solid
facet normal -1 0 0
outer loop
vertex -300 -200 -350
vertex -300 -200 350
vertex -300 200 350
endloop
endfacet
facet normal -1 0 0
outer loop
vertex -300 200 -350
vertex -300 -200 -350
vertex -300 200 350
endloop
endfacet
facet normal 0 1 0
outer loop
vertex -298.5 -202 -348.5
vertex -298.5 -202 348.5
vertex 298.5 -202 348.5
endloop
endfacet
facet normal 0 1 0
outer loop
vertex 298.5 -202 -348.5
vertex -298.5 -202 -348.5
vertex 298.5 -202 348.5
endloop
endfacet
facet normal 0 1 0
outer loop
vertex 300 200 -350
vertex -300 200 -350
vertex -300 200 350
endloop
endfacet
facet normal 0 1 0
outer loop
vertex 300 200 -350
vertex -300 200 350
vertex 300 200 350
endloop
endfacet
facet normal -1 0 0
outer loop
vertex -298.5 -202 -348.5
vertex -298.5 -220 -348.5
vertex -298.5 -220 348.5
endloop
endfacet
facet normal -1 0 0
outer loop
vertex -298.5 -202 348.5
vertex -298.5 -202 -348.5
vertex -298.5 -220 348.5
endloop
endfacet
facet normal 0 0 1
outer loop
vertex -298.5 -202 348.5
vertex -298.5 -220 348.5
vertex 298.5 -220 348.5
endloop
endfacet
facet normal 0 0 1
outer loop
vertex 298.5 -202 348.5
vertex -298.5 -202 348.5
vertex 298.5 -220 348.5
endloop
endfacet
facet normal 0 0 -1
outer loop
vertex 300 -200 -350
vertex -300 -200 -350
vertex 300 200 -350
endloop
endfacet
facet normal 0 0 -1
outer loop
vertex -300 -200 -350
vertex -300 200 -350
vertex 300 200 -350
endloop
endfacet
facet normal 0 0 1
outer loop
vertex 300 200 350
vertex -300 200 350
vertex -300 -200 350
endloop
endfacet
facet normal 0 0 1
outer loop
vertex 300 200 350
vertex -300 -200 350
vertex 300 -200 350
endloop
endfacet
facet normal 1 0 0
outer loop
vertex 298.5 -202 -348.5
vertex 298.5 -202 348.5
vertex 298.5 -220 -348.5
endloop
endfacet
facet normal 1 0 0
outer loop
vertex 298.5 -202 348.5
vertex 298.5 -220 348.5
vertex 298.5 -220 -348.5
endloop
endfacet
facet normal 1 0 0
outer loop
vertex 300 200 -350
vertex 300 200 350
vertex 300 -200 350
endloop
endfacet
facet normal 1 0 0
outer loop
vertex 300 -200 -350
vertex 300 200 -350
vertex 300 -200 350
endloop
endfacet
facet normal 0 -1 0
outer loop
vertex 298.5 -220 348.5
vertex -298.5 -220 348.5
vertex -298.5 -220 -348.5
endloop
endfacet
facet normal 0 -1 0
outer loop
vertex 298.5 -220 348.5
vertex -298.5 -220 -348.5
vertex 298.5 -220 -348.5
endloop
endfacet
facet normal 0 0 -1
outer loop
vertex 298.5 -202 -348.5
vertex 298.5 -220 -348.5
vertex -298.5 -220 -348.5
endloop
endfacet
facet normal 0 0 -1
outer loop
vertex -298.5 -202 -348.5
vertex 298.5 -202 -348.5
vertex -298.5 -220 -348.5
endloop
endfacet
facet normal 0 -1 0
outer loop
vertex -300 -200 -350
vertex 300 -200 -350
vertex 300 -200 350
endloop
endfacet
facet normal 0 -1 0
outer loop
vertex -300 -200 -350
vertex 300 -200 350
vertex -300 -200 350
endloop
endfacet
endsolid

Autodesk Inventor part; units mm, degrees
ref_plane "YZ Plane" through (0, 0, 0) normal (1, 0, 0) x (0, 1, 0)
ref_plane "XZ Plane" through (0, 0, 0) normal (0, 1, 0) x (-1, 0, 0)
ref_plane "XY Plane" through (0, 0, 0) normal (0, 0, 1) x (1, 0, 0)
sketch "Sketch1" plane through (0, 0, 0) normal (0, 0, 1) x (1, 0, 0)
  line L0 (-300, 200) -> (300, 200)
  line L1 (300, 200) -> (300, -200)
  line L2 (300, -200) -> (-300, -200)
  line L3 (-300, -200) -> (-300, 200)
  line L4 (-300, 200) -> (300, -200) construction
  line L5 (300, 200) -> (-300, -200) construction
  point P0 (0, 0)
  dimension "Width" = 600
  dimension "Depth" = 400
extrude "Extrusion1" add sketch "Sketch1" along normal mid plane 700
sketch "Sketch2" plane through (-300, -200, 350) normal (0, -1, 0) x (1, 0, 0)
  line L0 (600, 0) -> (600, -700) projected
  line L1 (0, 0) -> (600, 0) projected
  line L2 (0, 0) -> (0, -700) projected
  line L3 (600, -700) -> (0, -700) projected
  point P0 (300, -350)
extrude "Extrusion2" add sketch "Sketch2" against normal blind 18 separate body
sketch "Sketch4" plane through (-300, -200, 350) normal (0, -1, 0) x (1, 0, 0)
  line L0 (600, -700) -> (600, 0) construction
  line L1 (600, 0) -> (0, 0) construction
  line L2 (0, 0) -> (0, -700) construction
  line L3 (0, -700) -> (600, -700) construction
  line L4 (1.5, -1.5) -> (598.5, -1.5)
  line L5 (598.5, -1.5) -> (598.5, -698.5)
  line L6 (598.5, -698.5) -> (1.5, -698.5)
  line L7 (1.5, -698.5) -> (1.5, -1.5)
  point P0 (300, -350)
  dimension "Top_offset" = 1.5
  dimension "Bottom_offset" = 1.5
  dimension "Left_offset" = 1.5
  dimension "Right_offset" = 1.5
extrude "Extrusion3" cut sketch "Sketch4" against normal through all keep common part bodies 2
move or copy body "Move1" bodies to move or copy 2 copy no translate (0, -20, 0)
equation "\"d4\" = Panel_thickness"
equation "\"d8\" = -Panel_thickness - Front_offset"
equation "\"Panel_thickness\" = 18"
equation "\"Front_offset\" = 2"
properties part number "Simple door Skeleton"
